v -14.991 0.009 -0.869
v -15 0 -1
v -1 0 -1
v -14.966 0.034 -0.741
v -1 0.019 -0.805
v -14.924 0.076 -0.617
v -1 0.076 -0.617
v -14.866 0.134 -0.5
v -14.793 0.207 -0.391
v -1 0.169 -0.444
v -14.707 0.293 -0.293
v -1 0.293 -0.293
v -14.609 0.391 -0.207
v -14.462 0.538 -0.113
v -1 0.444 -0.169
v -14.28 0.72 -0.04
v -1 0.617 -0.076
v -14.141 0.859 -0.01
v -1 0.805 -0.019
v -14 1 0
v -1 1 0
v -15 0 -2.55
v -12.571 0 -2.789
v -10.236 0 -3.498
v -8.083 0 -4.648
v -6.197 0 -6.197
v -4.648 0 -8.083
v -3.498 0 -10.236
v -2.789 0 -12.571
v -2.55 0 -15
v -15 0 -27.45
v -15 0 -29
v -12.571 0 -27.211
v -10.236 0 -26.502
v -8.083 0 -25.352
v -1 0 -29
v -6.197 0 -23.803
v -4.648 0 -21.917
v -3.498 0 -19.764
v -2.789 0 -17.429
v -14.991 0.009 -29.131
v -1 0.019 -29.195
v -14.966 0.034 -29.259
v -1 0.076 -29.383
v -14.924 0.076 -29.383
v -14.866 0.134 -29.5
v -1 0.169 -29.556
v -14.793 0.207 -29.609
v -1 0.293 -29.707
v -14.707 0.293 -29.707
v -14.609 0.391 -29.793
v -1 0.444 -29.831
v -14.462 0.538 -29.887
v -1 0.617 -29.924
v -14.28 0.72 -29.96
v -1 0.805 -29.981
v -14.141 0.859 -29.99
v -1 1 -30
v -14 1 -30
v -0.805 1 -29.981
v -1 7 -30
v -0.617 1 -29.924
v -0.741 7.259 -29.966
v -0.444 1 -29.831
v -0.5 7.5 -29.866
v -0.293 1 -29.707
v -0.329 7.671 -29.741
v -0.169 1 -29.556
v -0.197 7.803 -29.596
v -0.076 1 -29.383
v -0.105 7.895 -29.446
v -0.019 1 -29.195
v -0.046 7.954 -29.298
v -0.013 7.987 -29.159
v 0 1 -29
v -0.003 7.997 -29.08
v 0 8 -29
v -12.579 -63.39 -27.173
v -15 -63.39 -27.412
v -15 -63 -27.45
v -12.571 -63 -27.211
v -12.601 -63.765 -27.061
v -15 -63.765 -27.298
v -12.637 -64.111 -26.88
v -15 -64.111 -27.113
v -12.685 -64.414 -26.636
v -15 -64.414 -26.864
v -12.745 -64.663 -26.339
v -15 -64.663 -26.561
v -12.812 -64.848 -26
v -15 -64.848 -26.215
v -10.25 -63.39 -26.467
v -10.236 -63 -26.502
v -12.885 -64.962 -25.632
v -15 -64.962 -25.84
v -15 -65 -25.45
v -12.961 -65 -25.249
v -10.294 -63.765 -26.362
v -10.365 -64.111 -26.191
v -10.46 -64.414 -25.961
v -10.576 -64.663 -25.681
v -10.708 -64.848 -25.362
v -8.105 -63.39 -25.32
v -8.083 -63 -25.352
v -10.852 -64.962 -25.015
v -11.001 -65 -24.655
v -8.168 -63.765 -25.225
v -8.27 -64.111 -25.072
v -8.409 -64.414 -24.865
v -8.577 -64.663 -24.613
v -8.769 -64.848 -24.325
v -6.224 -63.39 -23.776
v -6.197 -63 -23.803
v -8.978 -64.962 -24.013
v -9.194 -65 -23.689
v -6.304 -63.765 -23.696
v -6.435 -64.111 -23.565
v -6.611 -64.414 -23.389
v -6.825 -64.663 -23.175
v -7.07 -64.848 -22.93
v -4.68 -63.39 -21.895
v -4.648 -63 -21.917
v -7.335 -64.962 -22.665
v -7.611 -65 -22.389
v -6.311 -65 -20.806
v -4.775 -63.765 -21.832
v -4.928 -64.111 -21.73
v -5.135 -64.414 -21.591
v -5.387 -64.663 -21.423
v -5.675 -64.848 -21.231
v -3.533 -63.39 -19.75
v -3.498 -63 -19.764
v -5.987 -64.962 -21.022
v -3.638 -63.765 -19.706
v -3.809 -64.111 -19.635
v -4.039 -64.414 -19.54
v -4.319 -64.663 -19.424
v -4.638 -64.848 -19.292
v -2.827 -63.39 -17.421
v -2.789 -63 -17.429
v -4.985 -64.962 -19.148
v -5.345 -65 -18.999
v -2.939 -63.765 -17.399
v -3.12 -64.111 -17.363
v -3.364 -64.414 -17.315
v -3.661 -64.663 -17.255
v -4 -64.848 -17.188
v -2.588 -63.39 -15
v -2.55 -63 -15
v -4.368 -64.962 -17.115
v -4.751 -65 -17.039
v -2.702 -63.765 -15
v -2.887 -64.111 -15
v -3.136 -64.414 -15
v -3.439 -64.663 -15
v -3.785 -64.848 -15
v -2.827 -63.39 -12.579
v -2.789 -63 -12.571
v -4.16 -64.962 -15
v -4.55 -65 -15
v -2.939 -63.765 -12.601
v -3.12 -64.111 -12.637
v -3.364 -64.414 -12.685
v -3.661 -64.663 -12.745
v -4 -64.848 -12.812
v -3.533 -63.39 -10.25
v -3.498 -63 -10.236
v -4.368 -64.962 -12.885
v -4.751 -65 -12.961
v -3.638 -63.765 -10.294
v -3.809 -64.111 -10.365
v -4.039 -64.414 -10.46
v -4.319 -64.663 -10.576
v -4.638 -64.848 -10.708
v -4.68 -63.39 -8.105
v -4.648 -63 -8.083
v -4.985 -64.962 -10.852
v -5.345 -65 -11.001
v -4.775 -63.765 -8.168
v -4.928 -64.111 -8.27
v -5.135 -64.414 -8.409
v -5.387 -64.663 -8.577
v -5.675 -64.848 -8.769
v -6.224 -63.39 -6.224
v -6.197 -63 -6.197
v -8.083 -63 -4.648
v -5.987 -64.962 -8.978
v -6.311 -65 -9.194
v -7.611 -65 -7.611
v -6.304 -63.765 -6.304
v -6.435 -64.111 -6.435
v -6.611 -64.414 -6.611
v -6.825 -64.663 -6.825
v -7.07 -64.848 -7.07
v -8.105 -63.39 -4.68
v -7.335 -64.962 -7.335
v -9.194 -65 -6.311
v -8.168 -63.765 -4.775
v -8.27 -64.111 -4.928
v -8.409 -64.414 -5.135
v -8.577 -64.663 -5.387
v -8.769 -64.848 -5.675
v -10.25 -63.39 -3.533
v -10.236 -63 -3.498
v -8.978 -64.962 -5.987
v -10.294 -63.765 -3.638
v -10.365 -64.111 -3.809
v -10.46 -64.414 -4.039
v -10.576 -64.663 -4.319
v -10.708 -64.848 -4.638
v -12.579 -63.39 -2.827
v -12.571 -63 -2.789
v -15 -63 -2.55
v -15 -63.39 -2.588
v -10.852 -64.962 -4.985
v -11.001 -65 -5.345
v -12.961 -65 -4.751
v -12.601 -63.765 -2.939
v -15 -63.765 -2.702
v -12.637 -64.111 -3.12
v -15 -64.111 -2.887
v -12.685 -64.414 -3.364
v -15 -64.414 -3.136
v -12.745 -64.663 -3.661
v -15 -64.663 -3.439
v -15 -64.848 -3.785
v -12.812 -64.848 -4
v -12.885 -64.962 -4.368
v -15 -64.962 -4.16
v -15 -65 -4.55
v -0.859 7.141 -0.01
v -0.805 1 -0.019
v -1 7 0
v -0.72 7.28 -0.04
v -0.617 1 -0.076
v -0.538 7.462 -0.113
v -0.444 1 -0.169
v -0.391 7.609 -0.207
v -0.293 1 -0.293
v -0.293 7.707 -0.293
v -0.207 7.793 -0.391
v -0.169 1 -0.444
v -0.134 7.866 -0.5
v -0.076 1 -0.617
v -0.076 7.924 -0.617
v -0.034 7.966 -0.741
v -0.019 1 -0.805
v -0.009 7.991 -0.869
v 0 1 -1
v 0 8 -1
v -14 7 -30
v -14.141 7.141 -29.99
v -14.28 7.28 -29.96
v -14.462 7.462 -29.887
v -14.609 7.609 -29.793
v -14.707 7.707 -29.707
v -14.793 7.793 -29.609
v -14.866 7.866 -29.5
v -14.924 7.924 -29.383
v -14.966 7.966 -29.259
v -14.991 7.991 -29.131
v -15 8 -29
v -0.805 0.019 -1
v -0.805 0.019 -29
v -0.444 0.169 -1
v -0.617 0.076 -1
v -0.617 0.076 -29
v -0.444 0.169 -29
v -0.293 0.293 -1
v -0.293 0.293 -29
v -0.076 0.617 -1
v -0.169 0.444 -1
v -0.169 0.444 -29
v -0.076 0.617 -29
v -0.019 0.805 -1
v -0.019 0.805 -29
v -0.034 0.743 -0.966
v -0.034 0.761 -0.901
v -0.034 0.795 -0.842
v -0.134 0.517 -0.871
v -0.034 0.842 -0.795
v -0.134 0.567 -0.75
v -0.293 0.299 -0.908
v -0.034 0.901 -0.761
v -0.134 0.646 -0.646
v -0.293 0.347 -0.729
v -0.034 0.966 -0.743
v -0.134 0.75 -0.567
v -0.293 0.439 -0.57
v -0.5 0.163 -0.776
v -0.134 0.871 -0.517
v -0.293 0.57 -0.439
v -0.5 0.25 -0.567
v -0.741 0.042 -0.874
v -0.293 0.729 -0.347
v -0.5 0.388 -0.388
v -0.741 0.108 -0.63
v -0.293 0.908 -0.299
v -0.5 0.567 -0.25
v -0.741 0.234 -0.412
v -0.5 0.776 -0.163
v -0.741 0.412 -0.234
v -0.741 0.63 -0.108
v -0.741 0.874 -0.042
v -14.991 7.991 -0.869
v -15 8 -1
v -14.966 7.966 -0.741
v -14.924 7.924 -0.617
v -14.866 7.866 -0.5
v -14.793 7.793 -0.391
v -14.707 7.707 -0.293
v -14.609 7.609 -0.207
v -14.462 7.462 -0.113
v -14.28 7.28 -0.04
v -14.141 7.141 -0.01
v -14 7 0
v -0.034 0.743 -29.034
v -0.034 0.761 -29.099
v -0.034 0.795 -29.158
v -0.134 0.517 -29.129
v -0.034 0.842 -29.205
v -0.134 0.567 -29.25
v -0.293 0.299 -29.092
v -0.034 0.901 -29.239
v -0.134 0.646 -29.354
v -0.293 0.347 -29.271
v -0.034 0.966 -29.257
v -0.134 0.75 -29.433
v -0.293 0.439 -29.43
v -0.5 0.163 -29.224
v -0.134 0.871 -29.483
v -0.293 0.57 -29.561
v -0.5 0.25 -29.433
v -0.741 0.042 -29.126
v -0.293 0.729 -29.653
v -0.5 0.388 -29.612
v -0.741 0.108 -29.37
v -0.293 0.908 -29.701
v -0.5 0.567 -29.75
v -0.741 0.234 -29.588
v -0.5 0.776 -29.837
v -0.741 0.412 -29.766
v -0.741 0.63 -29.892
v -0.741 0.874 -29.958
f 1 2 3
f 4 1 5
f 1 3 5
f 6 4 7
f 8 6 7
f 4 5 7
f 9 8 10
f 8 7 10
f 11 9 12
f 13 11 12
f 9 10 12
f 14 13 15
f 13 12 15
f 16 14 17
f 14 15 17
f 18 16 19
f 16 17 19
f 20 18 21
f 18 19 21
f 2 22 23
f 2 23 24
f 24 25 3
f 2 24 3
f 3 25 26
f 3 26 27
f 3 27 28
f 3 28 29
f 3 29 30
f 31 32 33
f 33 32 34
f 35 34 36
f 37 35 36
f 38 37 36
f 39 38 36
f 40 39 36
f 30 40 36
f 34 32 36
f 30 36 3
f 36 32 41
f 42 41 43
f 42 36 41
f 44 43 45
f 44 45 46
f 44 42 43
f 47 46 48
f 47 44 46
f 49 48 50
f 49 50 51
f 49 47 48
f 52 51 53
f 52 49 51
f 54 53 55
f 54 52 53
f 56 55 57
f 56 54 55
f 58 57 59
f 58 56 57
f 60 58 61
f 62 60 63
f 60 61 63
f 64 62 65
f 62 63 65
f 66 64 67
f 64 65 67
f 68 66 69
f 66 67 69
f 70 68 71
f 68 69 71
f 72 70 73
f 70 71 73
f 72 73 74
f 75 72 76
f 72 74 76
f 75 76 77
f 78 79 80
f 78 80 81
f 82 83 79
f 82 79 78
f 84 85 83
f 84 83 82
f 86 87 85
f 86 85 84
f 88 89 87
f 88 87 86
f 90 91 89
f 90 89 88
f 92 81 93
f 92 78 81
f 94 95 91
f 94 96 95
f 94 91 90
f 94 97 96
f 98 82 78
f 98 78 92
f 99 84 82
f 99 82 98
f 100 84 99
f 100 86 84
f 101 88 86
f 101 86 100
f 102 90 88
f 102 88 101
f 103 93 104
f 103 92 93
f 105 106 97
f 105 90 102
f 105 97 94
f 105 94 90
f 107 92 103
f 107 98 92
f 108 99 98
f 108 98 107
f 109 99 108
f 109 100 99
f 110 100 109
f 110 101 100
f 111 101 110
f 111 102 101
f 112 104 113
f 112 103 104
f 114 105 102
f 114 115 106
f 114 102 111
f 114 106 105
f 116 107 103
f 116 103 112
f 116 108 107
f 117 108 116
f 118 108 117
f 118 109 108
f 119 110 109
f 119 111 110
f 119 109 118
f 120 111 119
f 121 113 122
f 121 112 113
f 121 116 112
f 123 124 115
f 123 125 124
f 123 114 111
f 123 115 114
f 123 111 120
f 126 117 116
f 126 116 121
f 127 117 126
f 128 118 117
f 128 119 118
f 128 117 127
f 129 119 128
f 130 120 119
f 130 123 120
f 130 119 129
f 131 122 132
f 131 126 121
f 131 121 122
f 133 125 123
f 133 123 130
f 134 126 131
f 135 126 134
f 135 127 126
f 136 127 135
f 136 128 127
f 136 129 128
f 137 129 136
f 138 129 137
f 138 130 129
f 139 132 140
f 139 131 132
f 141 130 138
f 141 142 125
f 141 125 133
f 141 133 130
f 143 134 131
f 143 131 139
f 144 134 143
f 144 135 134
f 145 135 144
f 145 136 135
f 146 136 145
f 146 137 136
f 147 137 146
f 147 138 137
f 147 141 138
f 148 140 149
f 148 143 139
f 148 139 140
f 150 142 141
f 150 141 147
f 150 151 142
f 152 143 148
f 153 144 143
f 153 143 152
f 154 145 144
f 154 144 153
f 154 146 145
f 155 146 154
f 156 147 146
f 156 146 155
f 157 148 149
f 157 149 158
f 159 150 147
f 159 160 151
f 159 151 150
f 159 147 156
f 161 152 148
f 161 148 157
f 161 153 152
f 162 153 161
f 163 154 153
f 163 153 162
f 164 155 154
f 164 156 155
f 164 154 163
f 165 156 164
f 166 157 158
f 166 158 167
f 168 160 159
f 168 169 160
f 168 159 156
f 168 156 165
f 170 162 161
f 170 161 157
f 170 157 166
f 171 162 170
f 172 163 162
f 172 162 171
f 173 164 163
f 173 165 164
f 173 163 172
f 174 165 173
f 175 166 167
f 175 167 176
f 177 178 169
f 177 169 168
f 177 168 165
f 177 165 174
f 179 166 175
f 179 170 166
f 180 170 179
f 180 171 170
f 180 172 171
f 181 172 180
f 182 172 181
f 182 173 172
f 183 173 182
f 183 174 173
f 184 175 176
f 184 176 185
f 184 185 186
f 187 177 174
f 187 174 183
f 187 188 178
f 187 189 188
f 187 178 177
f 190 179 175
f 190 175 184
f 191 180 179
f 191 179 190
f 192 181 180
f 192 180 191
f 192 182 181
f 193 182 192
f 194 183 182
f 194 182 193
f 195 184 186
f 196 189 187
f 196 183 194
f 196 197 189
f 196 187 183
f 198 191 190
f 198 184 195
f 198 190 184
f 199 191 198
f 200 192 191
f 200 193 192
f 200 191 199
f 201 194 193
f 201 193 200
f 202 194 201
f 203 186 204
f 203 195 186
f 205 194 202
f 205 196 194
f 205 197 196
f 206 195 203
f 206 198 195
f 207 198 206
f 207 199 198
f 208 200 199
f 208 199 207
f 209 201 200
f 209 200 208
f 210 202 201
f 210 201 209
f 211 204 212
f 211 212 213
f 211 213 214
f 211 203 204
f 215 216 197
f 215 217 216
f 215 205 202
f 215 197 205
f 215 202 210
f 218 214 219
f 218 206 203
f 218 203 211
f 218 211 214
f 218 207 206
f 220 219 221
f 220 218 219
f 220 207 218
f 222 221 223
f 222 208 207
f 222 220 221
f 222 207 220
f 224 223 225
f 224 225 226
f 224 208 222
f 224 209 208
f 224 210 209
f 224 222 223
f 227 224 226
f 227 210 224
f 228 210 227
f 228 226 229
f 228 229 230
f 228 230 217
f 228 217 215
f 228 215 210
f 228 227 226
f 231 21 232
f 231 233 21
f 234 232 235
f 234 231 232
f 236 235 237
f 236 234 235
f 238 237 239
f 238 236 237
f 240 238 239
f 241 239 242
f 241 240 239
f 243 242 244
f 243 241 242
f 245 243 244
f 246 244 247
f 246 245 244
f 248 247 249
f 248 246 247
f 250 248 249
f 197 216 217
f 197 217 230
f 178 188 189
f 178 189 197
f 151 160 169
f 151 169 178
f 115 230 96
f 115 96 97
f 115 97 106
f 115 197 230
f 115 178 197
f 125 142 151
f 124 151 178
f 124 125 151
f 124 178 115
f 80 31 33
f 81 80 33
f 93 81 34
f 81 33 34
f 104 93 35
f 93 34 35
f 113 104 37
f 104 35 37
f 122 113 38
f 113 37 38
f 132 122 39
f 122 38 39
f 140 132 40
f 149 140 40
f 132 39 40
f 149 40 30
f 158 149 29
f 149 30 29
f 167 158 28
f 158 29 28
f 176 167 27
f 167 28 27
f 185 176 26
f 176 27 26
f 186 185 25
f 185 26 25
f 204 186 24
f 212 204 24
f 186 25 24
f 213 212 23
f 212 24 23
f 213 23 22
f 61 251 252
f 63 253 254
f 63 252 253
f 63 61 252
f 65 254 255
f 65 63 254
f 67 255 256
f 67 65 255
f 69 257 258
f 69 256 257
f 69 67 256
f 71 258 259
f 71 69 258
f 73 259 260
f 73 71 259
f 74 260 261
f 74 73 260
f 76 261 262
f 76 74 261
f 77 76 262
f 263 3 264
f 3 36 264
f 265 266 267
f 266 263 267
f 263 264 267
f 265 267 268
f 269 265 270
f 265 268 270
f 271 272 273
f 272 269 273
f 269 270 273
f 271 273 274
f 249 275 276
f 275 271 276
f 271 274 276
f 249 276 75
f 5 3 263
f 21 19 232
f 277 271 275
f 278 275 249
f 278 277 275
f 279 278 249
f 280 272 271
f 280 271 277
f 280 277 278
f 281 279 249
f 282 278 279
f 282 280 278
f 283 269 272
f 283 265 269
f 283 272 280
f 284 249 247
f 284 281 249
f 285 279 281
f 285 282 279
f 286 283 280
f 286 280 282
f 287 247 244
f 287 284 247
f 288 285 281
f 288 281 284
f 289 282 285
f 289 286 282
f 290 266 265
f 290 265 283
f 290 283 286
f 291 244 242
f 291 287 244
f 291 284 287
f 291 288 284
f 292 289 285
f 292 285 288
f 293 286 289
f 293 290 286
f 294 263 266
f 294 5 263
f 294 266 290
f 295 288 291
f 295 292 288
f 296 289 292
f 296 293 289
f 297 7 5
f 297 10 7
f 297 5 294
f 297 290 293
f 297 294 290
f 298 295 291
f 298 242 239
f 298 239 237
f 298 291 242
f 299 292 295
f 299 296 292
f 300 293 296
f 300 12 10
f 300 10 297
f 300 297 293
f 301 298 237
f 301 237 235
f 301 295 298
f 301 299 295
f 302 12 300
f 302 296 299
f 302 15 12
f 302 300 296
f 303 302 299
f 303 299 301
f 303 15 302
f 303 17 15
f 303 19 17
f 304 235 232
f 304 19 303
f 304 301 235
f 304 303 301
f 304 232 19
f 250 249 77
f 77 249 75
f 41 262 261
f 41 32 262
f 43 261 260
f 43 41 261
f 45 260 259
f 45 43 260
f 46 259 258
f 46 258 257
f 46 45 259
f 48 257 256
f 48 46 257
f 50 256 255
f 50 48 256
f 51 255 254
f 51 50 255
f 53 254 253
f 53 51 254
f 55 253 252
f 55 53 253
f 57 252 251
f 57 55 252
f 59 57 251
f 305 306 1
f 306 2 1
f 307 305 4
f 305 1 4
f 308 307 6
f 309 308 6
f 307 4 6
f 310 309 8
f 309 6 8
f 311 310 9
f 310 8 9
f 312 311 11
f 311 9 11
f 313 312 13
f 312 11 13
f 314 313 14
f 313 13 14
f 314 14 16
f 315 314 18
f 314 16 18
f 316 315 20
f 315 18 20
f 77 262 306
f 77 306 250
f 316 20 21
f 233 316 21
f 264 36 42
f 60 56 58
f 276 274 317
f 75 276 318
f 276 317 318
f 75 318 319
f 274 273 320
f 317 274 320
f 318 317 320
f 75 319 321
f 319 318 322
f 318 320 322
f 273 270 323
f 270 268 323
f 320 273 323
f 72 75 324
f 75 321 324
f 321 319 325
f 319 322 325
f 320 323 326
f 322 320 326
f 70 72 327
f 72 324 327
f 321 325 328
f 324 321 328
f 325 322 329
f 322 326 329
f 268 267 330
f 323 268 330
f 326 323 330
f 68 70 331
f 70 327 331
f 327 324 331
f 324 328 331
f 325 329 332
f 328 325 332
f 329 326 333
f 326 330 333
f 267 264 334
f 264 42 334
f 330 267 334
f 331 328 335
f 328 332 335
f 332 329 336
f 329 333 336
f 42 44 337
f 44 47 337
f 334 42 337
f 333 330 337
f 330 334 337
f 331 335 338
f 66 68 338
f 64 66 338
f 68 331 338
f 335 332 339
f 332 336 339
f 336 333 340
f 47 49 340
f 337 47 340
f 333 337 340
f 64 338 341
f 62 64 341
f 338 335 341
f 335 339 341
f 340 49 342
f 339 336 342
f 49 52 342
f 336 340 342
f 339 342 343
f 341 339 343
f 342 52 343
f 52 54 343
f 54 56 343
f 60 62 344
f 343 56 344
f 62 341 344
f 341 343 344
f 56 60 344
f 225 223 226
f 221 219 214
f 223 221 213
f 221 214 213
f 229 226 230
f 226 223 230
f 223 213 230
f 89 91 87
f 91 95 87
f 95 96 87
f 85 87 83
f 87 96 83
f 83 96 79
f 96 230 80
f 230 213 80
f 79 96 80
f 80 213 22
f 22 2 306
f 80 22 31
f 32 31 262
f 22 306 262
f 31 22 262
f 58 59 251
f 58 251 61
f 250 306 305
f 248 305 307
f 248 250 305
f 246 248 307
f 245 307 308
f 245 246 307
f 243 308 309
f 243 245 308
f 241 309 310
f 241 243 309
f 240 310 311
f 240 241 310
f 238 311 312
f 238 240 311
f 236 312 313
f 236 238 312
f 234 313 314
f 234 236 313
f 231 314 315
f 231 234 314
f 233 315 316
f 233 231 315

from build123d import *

# Parameters (mm, degrees)
SKETCH_1_W          = 30
SKETCH_1_H          = 30
EXTRUDE_1_DEPTH     = 8
SKETCH_2_R          = 12.45
EXTRUDE_2_DEPTH     = 65
SKETCH_3_W          = 15
SKETCH_3_H          = 30
CUT_EXTRUDE_1_DEPTH = 85.433405711
FILLET_1_R          = 2
FILLET_2_R          = 1


with BuildPart() as part:
    # 草图1 → 凸台-拉伸1 (new body)
    with BuildSketch(Plane(origin=(0, 0, 0), x_dir=(1, 0, 0), z_dir=(0, 1, 0))):
        with Locations((-15, 15)):
            Rectangle(SKETCH_1_W, SKETCH_1_H)
    extrude(amount=EXTRUDE_1_DEPTH)

    # 草图2 → 凸台-拉伸2 (add)
    with BuildSketch(Plane.XZ):
        with Locations(Location((-15, -15, 0), (0, 0, 270))):
            Circle(SKETCH_2_R)
    extrude(amount=EXTRUDE_2_DEPTH)

    # 草图3 → 切除-拉伸1 (cut, through all)
    with BuildSketch(Plane(origin=(0, 8, 0), x_dir=(1, 0, 0), z_dir=(0, 1, 0))):
        with Locations((-22.5, 15)):
            Rectangle(SKETCH_3_W, SKETCH_3_H)
    extrude(amount=-CUT_EXTRUDE_1_DEPTH, mode=Mode.SUBTRACT)

    # 圆角1
    fillet_1_edges = [part.edges().sort_by_distance(p)[0] for p in [
        (-2.55, -65, -15),
    ]]
    fillet(fillet_1_edges, radius=FILLET_1_R)

    # 圆角2
    fillet_2_edges = [part.edges().sort_by_distance(p)[0] for p in [
        (-7.5, 0, 0),
        (-7.5, 8, 0),
        (-15, 4, 0),
        (-15, 4, -30),
        (-7.5, 0, -30),
        (0, 0, -15),
        (0, 4, 0),
        (0, 4, -30),
        (-7.5, 8, -30),
    ]]
    fillet(fillet_2_edges, radius=FILLET_2_R)


solid = part.part
